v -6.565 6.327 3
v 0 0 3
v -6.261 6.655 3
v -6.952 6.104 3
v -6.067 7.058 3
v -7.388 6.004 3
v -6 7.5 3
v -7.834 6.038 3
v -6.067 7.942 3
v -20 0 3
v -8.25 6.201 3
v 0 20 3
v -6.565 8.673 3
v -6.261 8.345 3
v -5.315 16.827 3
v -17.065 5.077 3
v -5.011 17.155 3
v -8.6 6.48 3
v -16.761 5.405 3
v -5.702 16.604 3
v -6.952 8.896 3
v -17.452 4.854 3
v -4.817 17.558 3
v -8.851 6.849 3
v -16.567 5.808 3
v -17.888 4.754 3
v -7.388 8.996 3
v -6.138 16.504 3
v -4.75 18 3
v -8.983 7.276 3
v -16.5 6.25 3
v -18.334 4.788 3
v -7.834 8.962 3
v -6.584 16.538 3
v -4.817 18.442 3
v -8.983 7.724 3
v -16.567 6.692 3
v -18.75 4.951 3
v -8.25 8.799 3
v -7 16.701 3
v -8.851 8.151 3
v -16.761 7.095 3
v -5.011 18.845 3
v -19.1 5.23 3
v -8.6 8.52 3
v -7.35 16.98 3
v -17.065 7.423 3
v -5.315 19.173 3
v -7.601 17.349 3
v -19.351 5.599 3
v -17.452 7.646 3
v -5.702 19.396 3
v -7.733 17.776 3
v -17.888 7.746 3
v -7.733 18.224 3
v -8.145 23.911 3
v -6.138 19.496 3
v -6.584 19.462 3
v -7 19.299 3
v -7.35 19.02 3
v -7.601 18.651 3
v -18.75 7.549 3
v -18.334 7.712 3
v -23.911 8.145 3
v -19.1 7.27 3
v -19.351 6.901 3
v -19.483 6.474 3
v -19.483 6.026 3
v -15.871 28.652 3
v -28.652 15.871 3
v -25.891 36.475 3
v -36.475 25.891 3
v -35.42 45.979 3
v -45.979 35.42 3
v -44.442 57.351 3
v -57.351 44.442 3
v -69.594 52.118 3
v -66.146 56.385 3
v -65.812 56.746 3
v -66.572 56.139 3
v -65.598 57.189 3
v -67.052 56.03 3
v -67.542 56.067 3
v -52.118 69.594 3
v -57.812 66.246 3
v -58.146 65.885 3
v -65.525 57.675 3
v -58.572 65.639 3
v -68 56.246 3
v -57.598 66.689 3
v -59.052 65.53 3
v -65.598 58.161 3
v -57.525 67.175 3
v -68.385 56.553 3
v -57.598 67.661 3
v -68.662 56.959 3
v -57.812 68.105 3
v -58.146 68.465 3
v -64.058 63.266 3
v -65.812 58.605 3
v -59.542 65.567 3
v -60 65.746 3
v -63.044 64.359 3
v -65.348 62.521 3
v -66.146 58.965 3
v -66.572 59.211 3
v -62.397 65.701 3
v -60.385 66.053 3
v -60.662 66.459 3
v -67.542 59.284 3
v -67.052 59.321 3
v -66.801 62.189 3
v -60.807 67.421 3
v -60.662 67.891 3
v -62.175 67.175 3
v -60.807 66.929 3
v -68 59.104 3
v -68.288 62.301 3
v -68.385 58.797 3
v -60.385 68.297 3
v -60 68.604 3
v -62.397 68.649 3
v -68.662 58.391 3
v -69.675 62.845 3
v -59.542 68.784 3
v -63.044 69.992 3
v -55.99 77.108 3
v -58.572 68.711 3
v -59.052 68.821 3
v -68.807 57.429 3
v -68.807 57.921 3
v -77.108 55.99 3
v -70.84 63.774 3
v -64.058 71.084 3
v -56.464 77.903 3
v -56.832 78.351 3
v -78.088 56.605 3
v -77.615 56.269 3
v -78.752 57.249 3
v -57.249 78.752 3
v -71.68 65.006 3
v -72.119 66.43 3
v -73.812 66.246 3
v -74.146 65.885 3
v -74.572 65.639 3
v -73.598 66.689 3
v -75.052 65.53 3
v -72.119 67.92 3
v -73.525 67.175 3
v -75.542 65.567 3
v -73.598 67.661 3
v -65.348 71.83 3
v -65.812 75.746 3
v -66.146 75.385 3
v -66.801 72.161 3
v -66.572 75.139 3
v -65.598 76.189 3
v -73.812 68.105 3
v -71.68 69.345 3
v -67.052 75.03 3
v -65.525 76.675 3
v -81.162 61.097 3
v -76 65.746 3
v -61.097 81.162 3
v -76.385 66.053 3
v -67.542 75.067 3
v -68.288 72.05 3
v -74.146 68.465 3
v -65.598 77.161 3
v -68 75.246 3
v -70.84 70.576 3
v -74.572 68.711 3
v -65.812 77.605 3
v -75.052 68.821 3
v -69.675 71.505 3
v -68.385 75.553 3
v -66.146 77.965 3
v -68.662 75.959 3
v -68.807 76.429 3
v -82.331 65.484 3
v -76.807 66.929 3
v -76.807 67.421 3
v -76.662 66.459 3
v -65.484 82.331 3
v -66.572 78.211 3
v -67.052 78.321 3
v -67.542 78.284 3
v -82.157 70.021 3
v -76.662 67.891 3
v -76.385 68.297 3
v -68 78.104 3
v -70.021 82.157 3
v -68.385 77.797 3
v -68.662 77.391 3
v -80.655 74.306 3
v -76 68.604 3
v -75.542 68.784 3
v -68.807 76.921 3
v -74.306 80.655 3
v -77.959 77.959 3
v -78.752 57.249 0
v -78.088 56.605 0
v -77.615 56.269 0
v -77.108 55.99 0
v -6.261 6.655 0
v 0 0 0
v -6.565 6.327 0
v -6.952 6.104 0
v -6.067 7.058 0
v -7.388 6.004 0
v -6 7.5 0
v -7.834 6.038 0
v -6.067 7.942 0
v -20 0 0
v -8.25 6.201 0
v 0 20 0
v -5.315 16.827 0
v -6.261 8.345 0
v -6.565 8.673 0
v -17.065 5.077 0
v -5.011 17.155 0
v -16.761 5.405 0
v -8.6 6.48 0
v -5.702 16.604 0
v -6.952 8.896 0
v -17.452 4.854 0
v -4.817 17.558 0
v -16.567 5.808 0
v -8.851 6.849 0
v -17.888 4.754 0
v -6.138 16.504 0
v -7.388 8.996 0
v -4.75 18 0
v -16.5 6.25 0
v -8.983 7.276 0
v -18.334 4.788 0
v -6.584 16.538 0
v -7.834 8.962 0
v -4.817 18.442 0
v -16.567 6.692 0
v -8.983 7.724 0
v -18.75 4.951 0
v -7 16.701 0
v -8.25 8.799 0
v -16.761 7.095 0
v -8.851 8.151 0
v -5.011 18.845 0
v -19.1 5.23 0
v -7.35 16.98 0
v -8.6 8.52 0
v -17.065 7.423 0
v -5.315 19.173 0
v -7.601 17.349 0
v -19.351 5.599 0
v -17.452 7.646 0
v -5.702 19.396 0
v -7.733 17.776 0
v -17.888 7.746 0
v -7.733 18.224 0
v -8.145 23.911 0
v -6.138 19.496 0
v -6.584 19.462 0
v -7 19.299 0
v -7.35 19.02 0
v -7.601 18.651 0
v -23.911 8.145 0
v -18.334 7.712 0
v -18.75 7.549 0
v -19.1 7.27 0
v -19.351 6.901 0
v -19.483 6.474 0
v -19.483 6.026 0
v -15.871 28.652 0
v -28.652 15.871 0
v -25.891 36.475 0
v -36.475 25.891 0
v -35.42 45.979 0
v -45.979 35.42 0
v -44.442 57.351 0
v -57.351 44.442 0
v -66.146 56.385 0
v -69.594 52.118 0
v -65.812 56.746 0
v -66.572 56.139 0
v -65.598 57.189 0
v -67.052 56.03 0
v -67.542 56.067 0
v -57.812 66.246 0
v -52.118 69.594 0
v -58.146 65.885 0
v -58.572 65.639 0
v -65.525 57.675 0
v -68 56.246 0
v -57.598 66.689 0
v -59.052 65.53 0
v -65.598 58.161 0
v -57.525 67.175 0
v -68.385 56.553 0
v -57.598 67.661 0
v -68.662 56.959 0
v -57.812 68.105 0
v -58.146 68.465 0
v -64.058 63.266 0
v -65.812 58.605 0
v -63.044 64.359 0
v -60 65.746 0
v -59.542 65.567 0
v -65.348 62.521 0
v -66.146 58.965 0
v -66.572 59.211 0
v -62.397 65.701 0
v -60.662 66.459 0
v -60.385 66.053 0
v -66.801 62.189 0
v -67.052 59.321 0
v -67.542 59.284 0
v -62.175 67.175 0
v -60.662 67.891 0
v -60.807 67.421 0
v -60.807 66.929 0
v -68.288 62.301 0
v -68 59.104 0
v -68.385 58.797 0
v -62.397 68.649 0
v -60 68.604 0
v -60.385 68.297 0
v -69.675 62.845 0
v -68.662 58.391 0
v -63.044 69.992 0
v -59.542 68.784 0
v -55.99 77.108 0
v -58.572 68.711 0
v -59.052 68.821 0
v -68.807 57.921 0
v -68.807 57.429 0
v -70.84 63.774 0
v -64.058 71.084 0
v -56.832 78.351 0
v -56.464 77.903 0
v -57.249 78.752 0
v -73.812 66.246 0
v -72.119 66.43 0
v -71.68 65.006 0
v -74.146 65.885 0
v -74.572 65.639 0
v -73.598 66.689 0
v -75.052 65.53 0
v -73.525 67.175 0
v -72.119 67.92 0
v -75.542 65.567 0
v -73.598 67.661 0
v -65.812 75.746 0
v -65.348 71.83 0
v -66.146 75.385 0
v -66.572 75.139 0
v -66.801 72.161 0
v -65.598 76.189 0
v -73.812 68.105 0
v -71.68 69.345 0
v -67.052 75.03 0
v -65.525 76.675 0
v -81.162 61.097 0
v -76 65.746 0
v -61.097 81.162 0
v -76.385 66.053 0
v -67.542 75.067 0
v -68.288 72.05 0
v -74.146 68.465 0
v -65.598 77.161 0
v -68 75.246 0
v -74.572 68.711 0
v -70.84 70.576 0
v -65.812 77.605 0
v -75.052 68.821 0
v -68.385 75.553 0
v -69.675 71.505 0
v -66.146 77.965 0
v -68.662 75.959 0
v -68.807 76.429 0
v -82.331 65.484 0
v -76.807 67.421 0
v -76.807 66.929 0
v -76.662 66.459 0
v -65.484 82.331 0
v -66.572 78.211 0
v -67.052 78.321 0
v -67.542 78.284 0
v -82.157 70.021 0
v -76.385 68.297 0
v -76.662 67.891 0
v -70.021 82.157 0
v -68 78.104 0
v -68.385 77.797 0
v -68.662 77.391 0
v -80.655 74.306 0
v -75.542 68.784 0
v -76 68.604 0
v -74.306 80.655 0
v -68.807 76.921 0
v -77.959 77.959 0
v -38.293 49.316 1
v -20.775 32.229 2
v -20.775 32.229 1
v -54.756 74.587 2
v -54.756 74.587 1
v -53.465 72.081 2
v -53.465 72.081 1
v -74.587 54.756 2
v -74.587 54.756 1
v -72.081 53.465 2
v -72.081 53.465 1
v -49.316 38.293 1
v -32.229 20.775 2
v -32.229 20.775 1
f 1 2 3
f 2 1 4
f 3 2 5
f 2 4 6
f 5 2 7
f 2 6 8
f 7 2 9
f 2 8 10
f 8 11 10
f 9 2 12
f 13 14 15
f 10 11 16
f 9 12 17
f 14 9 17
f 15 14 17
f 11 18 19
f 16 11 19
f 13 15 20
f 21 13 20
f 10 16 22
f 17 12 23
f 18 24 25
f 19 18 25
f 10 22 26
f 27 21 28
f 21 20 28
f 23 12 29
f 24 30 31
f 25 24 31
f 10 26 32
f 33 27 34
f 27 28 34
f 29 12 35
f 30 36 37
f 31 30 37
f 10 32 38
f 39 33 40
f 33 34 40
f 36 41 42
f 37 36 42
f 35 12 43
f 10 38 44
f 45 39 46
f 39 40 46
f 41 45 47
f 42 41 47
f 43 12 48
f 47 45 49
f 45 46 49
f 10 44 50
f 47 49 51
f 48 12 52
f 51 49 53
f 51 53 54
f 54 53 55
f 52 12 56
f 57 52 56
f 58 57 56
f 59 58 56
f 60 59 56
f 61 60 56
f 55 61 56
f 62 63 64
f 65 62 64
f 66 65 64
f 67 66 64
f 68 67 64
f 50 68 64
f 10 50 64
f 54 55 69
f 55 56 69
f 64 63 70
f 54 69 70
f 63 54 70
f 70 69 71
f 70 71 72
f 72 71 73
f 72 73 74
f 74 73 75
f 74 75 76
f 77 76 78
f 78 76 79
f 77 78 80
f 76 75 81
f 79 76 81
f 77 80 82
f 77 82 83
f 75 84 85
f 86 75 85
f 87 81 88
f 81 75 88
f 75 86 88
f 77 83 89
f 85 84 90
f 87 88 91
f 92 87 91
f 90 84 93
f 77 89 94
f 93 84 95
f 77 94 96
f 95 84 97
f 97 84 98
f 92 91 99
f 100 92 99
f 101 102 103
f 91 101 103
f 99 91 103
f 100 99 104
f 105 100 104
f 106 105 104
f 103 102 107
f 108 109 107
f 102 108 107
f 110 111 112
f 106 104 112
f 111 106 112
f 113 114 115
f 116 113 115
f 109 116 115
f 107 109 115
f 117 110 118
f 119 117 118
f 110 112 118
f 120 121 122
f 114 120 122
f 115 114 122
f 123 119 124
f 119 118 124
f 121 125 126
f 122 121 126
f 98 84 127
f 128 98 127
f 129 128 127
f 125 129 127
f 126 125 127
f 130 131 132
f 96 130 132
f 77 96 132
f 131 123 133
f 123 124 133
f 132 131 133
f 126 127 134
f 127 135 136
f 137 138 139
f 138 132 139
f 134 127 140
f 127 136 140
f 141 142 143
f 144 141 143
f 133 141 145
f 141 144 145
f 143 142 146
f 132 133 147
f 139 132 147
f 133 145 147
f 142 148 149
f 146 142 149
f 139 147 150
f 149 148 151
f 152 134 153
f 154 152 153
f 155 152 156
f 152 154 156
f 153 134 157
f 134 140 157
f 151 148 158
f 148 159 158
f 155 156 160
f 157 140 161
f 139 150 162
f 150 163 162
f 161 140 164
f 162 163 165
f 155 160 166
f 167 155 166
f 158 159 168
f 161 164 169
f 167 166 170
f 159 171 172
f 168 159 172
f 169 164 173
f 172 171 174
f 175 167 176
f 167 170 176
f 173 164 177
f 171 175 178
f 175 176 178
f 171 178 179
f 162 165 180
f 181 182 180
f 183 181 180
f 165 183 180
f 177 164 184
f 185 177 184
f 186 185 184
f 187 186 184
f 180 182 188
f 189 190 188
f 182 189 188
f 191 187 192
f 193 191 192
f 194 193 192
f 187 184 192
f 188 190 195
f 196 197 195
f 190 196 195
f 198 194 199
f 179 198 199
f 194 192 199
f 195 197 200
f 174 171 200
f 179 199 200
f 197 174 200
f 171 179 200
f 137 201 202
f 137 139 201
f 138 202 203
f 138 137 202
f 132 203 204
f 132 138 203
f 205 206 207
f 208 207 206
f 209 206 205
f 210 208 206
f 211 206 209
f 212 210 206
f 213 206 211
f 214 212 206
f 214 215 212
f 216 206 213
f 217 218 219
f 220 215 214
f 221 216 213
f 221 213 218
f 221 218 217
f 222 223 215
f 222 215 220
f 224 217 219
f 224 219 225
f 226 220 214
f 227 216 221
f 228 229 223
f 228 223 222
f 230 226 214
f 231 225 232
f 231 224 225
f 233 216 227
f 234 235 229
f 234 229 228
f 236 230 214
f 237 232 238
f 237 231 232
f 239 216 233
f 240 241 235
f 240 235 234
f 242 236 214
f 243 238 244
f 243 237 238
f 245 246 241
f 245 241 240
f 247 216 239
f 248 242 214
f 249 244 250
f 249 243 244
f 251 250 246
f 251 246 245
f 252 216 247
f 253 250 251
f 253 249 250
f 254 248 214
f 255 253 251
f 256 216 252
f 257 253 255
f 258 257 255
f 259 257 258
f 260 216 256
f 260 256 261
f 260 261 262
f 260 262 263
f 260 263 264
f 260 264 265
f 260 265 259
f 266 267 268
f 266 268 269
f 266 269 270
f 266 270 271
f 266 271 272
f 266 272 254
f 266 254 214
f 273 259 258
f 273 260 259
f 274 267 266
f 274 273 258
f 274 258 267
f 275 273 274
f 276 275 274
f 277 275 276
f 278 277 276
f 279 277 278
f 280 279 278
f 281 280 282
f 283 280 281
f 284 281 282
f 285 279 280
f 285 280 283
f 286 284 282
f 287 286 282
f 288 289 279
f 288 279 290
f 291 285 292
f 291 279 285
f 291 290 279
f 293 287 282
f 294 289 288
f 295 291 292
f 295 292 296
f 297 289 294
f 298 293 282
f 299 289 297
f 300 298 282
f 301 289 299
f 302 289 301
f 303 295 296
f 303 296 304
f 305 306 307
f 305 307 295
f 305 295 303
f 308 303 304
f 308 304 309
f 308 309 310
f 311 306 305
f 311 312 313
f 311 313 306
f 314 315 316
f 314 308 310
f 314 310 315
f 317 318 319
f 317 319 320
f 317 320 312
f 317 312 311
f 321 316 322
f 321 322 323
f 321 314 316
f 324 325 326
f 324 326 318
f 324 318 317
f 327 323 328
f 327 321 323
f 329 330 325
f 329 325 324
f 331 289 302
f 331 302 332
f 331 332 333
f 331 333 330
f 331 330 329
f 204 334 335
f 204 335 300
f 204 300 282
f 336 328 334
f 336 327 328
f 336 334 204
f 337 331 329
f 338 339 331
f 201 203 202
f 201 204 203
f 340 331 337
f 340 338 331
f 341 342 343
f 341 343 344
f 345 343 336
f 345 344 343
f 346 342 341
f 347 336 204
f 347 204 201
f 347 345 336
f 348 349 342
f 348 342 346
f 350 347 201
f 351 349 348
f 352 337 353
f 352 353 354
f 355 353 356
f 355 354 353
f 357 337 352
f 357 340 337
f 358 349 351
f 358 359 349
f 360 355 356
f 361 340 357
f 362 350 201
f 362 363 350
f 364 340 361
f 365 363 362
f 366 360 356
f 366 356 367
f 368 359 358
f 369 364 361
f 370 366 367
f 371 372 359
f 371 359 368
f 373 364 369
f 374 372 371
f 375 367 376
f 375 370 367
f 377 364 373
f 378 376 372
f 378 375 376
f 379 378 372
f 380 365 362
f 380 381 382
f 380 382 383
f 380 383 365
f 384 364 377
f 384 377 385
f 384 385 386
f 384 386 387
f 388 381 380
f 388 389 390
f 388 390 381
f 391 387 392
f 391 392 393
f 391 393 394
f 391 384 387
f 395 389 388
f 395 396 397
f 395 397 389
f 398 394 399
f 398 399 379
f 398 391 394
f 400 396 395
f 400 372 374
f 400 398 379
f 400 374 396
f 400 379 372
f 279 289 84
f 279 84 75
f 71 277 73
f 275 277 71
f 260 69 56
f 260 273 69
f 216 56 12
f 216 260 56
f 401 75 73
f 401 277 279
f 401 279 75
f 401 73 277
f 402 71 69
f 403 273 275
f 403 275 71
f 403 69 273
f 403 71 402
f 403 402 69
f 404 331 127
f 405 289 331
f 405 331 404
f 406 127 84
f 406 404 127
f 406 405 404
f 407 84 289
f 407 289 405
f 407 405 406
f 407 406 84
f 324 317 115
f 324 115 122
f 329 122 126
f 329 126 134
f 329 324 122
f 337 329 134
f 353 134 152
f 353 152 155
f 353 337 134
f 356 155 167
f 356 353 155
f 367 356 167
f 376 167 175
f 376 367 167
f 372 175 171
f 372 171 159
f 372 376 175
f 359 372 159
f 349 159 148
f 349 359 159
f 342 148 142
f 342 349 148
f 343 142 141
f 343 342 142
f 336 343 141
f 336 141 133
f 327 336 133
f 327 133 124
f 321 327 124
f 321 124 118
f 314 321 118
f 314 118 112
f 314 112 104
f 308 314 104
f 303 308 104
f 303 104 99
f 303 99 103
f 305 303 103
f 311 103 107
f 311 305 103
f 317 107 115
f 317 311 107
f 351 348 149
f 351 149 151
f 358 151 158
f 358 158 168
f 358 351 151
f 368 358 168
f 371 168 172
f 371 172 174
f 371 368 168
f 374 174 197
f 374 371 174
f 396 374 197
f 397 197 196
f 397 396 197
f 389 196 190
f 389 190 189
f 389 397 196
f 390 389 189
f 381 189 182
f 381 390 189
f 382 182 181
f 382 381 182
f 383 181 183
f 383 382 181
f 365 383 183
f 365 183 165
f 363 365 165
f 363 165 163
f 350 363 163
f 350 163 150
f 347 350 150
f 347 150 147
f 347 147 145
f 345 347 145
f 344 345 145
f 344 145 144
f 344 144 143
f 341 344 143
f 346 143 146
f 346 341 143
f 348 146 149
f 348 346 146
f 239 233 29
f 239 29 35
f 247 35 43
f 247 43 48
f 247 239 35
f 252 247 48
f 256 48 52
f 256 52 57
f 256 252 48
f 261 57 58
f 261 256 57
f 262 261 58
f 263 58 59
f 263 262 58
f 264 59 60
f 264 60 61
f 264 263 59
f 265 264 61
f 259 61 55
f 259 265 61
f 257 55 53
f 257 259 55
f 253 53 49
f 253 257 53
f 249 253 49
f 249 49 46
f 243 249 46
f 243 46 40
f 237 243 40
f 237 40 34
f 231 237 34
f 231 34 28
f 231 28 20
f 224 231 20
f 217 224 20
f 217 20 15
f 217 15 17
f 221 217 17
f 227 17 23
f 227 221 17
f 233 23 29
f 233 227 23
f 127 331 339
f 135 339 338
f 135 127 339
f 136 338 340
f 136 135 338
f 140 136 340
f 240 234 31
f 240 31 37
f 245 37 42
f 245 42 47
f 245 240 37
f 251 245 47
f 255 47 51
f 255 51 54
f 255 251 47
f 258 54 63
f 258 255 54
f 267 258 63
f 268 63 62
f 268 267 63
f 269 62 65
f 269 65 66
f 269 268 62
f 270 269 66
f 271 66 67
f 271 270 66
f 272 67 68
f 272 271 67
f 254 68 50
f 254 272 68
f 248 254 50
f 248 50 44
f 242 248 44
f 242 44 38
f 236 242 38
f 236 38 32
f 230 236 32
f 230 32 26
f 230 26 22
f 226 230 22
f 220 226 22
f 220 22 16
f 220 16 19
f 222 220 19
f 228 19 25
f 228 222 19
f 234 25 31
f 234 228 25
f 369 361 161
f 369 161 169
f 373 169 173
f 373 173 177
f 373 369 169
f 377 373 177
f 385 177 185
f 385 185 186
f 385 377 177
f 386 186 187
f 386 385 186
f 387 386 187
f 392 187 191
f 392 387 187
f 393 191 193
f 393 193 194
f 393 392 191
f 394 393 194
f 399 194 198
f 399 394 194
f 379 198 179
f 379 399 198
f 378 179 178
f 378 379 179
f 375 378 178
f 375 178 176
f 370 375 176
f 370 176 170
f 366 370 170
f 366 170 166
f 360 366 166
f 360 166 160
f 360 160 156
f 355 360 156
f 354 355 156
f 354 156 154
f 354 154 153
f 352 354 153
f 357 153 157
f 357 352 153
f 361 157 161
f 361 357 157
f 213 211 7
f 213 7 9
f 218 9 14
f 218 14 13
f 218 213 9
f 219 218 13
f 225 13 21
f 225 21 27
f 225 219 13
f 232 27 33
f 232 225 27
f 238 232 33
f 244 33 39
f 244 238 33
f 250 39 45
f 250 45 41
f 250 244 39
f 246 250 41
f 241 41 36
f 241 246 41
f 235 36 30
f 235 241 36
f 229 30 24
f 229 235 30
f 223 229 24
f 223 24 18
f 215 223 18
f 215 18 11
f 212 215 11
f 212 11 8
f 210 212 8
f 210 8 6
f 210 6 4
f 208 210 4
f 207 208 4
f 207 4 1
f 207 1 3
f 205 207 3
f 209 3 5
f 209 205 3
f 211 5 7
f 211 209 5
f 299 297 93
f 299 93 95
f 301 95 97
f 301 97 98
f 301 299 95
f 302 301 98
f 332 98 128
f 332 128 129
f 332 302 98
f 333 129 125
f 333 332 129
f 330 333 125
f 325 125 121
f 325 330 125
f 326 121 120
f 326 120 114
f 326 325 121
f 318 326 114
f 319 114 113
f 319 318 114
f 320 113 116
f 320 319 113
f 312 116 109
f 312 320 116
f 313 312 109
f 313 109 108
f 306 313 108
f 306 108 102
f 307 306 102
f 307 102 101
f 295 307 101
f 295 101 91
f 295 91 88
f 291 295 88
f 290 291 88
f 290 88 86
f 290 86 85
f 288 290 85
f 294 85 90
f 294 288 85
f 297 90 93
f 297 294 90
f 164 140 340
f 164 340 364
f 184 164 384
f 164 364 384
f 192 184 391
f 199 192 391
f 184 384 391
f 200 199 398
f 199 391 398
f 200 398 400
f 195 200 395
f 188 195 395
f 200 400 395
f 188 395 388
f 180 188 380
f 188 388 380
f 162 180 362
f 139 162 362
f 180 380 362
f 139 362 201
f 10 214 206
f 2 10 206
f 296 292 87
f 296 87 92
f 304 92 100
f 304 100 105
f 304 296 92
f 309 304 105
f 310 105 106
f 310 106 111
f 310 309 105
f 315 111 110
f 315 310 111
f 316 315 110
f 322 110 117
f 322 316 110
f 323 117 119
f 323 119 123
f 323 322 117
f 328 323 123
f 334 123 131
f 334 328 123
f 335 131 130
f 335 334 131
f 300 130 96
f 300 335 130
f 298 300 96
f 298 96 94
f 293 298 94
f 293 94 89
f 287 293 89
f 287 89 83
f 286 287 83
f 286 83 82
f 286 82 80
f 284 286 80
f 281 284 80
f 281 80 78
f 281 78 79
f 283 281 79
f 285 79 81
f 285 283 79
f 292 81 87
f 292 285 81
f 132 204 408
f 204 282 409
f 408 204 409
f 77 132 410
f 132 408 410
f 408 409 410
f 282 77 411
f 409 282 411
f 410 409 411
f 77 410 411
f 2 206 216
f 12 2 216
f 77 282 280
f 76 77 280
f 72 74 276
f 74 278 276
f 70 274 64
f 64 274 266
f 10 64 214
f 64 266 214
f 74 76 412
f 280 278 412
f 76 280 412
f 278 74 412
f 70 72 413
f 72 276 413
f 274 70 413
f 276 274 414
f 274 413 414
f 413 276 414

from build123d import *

# Parameters (mm, degrees)
F0_R     = 1.5
F0_R_2   = 1.65
F0_R_3   = 5
F1_DEPTH = 3
F2_R     = 5


with BuildPart() as f1:
    # F0 (on Top) → F1 (new body)
    with BuildSketch(Plane.XY):
        with BuildLine():
            add(Edge.make_bspline(
                [(-52.118164, 69.593788), (-40.285984, 48.277058), (-22.257566, 29.243172), (0, 20)],
                knots=[9.256523, 9.256523, 9.256523, 9.256523, 80.865454, 80.865454, 80.865454, 80.865454], degree=3))
            ThreePointArc((-52.118164, 69.593788), (-51.973476, 68.388311), (-51.925144, 67.175144))
            ThreePointArc((-51.925144, 67.175144), (-57.28378, 55.568103), (-69.593788, 52.118164))
            add(Edge.make_bspline(
                [(-69.593788, 52.118164), (-48.277057, 40.285984), (-29.243172, 22.257566), (-20, 0)],
                knots=[9.256523, 9.256523, 9.256523, 9.256523, 80.865454, 80.865454, 80.865454, 80.865454], degree=3))
            Line((-20, 0), (0, 0))
            Line((0, 0), (0, 20))
        make_face()
        with Locations((-18, 6.25)):
            Circle(F0_R, mode=Mode.SUBTRACT)
        with Locations((-7.5, 7.5)):
            Circle(F0_R, mode=Mode.SUBTRACT)
        with Locations((-6.25, 18)):
            Circle(F0_R, mode=Mode.SUBTRACT)
        with BuildLine():
            add(Edge.make_bspline(
                [(-56.391766, 77.958523), (-55.0736, 75.142944), (-53.64765, 72.349293), (-52.118164, 69.593788)],
                knots=[0, 0, 0, 0, 9.256523, 9.256523, 9.256523, 9.256523], degree=3))
            ThreePointArc((-56.391766, 77.958523), (-77.958523, 77.958523), (-77.958523, 56.391766))
            add(Edge.make_bspline(
                [(-77.958523, 56.391766), (-75.142944, 55.0736), (-72.349293, 53.647649), (-69.593788, 52.118164)],
                knots=[0, 0, 0, 0, 9.256523, 9.256523, 9.256523, 9.256523], degree=3))
            ThreePointArc((-69.593788, 52.118164), (-57.28378, 55.568103), (-51.925144, 67.175144))
            ThreePointArc((-51.925144, 67.175144), (-51.973476, 68.388311), (-52.118164, 69.593788))
        make_face()
        with Locations((-67.175142, 57.675142)):
            Circle(F0_R_2, mode=Mode.SUBTRACT)
        with Locations((-75.175142, 67.175142)):
            Circle(F0_R_2, mode=Mode.SUBTRACT)
        with Locations((-67.175142, 67.175142)):
            Circle(F0_R_3, mode=Mode.SUBTRACT)
        with Locations((-67.175142, 76.675142)):
            Circle(F0_R_2, mode=Mode.SUBTRACT)
        with Locations((-59.175142, 67.175142)):
            Circle(F0_R_2, mode=Mode.SUBTRACT)
    extrude(amount=F1_DEPTH)

    # F2
    f2_edges = [f1.edges().sort_by_distance(p)[0] for p in [
        (-56.391766, 77.958523, 1.5),
        (-77.958523, 56.391766, 1.5),
    ]]
    fillet(f2_edges, radius=F2_R)


solid = f1.part
